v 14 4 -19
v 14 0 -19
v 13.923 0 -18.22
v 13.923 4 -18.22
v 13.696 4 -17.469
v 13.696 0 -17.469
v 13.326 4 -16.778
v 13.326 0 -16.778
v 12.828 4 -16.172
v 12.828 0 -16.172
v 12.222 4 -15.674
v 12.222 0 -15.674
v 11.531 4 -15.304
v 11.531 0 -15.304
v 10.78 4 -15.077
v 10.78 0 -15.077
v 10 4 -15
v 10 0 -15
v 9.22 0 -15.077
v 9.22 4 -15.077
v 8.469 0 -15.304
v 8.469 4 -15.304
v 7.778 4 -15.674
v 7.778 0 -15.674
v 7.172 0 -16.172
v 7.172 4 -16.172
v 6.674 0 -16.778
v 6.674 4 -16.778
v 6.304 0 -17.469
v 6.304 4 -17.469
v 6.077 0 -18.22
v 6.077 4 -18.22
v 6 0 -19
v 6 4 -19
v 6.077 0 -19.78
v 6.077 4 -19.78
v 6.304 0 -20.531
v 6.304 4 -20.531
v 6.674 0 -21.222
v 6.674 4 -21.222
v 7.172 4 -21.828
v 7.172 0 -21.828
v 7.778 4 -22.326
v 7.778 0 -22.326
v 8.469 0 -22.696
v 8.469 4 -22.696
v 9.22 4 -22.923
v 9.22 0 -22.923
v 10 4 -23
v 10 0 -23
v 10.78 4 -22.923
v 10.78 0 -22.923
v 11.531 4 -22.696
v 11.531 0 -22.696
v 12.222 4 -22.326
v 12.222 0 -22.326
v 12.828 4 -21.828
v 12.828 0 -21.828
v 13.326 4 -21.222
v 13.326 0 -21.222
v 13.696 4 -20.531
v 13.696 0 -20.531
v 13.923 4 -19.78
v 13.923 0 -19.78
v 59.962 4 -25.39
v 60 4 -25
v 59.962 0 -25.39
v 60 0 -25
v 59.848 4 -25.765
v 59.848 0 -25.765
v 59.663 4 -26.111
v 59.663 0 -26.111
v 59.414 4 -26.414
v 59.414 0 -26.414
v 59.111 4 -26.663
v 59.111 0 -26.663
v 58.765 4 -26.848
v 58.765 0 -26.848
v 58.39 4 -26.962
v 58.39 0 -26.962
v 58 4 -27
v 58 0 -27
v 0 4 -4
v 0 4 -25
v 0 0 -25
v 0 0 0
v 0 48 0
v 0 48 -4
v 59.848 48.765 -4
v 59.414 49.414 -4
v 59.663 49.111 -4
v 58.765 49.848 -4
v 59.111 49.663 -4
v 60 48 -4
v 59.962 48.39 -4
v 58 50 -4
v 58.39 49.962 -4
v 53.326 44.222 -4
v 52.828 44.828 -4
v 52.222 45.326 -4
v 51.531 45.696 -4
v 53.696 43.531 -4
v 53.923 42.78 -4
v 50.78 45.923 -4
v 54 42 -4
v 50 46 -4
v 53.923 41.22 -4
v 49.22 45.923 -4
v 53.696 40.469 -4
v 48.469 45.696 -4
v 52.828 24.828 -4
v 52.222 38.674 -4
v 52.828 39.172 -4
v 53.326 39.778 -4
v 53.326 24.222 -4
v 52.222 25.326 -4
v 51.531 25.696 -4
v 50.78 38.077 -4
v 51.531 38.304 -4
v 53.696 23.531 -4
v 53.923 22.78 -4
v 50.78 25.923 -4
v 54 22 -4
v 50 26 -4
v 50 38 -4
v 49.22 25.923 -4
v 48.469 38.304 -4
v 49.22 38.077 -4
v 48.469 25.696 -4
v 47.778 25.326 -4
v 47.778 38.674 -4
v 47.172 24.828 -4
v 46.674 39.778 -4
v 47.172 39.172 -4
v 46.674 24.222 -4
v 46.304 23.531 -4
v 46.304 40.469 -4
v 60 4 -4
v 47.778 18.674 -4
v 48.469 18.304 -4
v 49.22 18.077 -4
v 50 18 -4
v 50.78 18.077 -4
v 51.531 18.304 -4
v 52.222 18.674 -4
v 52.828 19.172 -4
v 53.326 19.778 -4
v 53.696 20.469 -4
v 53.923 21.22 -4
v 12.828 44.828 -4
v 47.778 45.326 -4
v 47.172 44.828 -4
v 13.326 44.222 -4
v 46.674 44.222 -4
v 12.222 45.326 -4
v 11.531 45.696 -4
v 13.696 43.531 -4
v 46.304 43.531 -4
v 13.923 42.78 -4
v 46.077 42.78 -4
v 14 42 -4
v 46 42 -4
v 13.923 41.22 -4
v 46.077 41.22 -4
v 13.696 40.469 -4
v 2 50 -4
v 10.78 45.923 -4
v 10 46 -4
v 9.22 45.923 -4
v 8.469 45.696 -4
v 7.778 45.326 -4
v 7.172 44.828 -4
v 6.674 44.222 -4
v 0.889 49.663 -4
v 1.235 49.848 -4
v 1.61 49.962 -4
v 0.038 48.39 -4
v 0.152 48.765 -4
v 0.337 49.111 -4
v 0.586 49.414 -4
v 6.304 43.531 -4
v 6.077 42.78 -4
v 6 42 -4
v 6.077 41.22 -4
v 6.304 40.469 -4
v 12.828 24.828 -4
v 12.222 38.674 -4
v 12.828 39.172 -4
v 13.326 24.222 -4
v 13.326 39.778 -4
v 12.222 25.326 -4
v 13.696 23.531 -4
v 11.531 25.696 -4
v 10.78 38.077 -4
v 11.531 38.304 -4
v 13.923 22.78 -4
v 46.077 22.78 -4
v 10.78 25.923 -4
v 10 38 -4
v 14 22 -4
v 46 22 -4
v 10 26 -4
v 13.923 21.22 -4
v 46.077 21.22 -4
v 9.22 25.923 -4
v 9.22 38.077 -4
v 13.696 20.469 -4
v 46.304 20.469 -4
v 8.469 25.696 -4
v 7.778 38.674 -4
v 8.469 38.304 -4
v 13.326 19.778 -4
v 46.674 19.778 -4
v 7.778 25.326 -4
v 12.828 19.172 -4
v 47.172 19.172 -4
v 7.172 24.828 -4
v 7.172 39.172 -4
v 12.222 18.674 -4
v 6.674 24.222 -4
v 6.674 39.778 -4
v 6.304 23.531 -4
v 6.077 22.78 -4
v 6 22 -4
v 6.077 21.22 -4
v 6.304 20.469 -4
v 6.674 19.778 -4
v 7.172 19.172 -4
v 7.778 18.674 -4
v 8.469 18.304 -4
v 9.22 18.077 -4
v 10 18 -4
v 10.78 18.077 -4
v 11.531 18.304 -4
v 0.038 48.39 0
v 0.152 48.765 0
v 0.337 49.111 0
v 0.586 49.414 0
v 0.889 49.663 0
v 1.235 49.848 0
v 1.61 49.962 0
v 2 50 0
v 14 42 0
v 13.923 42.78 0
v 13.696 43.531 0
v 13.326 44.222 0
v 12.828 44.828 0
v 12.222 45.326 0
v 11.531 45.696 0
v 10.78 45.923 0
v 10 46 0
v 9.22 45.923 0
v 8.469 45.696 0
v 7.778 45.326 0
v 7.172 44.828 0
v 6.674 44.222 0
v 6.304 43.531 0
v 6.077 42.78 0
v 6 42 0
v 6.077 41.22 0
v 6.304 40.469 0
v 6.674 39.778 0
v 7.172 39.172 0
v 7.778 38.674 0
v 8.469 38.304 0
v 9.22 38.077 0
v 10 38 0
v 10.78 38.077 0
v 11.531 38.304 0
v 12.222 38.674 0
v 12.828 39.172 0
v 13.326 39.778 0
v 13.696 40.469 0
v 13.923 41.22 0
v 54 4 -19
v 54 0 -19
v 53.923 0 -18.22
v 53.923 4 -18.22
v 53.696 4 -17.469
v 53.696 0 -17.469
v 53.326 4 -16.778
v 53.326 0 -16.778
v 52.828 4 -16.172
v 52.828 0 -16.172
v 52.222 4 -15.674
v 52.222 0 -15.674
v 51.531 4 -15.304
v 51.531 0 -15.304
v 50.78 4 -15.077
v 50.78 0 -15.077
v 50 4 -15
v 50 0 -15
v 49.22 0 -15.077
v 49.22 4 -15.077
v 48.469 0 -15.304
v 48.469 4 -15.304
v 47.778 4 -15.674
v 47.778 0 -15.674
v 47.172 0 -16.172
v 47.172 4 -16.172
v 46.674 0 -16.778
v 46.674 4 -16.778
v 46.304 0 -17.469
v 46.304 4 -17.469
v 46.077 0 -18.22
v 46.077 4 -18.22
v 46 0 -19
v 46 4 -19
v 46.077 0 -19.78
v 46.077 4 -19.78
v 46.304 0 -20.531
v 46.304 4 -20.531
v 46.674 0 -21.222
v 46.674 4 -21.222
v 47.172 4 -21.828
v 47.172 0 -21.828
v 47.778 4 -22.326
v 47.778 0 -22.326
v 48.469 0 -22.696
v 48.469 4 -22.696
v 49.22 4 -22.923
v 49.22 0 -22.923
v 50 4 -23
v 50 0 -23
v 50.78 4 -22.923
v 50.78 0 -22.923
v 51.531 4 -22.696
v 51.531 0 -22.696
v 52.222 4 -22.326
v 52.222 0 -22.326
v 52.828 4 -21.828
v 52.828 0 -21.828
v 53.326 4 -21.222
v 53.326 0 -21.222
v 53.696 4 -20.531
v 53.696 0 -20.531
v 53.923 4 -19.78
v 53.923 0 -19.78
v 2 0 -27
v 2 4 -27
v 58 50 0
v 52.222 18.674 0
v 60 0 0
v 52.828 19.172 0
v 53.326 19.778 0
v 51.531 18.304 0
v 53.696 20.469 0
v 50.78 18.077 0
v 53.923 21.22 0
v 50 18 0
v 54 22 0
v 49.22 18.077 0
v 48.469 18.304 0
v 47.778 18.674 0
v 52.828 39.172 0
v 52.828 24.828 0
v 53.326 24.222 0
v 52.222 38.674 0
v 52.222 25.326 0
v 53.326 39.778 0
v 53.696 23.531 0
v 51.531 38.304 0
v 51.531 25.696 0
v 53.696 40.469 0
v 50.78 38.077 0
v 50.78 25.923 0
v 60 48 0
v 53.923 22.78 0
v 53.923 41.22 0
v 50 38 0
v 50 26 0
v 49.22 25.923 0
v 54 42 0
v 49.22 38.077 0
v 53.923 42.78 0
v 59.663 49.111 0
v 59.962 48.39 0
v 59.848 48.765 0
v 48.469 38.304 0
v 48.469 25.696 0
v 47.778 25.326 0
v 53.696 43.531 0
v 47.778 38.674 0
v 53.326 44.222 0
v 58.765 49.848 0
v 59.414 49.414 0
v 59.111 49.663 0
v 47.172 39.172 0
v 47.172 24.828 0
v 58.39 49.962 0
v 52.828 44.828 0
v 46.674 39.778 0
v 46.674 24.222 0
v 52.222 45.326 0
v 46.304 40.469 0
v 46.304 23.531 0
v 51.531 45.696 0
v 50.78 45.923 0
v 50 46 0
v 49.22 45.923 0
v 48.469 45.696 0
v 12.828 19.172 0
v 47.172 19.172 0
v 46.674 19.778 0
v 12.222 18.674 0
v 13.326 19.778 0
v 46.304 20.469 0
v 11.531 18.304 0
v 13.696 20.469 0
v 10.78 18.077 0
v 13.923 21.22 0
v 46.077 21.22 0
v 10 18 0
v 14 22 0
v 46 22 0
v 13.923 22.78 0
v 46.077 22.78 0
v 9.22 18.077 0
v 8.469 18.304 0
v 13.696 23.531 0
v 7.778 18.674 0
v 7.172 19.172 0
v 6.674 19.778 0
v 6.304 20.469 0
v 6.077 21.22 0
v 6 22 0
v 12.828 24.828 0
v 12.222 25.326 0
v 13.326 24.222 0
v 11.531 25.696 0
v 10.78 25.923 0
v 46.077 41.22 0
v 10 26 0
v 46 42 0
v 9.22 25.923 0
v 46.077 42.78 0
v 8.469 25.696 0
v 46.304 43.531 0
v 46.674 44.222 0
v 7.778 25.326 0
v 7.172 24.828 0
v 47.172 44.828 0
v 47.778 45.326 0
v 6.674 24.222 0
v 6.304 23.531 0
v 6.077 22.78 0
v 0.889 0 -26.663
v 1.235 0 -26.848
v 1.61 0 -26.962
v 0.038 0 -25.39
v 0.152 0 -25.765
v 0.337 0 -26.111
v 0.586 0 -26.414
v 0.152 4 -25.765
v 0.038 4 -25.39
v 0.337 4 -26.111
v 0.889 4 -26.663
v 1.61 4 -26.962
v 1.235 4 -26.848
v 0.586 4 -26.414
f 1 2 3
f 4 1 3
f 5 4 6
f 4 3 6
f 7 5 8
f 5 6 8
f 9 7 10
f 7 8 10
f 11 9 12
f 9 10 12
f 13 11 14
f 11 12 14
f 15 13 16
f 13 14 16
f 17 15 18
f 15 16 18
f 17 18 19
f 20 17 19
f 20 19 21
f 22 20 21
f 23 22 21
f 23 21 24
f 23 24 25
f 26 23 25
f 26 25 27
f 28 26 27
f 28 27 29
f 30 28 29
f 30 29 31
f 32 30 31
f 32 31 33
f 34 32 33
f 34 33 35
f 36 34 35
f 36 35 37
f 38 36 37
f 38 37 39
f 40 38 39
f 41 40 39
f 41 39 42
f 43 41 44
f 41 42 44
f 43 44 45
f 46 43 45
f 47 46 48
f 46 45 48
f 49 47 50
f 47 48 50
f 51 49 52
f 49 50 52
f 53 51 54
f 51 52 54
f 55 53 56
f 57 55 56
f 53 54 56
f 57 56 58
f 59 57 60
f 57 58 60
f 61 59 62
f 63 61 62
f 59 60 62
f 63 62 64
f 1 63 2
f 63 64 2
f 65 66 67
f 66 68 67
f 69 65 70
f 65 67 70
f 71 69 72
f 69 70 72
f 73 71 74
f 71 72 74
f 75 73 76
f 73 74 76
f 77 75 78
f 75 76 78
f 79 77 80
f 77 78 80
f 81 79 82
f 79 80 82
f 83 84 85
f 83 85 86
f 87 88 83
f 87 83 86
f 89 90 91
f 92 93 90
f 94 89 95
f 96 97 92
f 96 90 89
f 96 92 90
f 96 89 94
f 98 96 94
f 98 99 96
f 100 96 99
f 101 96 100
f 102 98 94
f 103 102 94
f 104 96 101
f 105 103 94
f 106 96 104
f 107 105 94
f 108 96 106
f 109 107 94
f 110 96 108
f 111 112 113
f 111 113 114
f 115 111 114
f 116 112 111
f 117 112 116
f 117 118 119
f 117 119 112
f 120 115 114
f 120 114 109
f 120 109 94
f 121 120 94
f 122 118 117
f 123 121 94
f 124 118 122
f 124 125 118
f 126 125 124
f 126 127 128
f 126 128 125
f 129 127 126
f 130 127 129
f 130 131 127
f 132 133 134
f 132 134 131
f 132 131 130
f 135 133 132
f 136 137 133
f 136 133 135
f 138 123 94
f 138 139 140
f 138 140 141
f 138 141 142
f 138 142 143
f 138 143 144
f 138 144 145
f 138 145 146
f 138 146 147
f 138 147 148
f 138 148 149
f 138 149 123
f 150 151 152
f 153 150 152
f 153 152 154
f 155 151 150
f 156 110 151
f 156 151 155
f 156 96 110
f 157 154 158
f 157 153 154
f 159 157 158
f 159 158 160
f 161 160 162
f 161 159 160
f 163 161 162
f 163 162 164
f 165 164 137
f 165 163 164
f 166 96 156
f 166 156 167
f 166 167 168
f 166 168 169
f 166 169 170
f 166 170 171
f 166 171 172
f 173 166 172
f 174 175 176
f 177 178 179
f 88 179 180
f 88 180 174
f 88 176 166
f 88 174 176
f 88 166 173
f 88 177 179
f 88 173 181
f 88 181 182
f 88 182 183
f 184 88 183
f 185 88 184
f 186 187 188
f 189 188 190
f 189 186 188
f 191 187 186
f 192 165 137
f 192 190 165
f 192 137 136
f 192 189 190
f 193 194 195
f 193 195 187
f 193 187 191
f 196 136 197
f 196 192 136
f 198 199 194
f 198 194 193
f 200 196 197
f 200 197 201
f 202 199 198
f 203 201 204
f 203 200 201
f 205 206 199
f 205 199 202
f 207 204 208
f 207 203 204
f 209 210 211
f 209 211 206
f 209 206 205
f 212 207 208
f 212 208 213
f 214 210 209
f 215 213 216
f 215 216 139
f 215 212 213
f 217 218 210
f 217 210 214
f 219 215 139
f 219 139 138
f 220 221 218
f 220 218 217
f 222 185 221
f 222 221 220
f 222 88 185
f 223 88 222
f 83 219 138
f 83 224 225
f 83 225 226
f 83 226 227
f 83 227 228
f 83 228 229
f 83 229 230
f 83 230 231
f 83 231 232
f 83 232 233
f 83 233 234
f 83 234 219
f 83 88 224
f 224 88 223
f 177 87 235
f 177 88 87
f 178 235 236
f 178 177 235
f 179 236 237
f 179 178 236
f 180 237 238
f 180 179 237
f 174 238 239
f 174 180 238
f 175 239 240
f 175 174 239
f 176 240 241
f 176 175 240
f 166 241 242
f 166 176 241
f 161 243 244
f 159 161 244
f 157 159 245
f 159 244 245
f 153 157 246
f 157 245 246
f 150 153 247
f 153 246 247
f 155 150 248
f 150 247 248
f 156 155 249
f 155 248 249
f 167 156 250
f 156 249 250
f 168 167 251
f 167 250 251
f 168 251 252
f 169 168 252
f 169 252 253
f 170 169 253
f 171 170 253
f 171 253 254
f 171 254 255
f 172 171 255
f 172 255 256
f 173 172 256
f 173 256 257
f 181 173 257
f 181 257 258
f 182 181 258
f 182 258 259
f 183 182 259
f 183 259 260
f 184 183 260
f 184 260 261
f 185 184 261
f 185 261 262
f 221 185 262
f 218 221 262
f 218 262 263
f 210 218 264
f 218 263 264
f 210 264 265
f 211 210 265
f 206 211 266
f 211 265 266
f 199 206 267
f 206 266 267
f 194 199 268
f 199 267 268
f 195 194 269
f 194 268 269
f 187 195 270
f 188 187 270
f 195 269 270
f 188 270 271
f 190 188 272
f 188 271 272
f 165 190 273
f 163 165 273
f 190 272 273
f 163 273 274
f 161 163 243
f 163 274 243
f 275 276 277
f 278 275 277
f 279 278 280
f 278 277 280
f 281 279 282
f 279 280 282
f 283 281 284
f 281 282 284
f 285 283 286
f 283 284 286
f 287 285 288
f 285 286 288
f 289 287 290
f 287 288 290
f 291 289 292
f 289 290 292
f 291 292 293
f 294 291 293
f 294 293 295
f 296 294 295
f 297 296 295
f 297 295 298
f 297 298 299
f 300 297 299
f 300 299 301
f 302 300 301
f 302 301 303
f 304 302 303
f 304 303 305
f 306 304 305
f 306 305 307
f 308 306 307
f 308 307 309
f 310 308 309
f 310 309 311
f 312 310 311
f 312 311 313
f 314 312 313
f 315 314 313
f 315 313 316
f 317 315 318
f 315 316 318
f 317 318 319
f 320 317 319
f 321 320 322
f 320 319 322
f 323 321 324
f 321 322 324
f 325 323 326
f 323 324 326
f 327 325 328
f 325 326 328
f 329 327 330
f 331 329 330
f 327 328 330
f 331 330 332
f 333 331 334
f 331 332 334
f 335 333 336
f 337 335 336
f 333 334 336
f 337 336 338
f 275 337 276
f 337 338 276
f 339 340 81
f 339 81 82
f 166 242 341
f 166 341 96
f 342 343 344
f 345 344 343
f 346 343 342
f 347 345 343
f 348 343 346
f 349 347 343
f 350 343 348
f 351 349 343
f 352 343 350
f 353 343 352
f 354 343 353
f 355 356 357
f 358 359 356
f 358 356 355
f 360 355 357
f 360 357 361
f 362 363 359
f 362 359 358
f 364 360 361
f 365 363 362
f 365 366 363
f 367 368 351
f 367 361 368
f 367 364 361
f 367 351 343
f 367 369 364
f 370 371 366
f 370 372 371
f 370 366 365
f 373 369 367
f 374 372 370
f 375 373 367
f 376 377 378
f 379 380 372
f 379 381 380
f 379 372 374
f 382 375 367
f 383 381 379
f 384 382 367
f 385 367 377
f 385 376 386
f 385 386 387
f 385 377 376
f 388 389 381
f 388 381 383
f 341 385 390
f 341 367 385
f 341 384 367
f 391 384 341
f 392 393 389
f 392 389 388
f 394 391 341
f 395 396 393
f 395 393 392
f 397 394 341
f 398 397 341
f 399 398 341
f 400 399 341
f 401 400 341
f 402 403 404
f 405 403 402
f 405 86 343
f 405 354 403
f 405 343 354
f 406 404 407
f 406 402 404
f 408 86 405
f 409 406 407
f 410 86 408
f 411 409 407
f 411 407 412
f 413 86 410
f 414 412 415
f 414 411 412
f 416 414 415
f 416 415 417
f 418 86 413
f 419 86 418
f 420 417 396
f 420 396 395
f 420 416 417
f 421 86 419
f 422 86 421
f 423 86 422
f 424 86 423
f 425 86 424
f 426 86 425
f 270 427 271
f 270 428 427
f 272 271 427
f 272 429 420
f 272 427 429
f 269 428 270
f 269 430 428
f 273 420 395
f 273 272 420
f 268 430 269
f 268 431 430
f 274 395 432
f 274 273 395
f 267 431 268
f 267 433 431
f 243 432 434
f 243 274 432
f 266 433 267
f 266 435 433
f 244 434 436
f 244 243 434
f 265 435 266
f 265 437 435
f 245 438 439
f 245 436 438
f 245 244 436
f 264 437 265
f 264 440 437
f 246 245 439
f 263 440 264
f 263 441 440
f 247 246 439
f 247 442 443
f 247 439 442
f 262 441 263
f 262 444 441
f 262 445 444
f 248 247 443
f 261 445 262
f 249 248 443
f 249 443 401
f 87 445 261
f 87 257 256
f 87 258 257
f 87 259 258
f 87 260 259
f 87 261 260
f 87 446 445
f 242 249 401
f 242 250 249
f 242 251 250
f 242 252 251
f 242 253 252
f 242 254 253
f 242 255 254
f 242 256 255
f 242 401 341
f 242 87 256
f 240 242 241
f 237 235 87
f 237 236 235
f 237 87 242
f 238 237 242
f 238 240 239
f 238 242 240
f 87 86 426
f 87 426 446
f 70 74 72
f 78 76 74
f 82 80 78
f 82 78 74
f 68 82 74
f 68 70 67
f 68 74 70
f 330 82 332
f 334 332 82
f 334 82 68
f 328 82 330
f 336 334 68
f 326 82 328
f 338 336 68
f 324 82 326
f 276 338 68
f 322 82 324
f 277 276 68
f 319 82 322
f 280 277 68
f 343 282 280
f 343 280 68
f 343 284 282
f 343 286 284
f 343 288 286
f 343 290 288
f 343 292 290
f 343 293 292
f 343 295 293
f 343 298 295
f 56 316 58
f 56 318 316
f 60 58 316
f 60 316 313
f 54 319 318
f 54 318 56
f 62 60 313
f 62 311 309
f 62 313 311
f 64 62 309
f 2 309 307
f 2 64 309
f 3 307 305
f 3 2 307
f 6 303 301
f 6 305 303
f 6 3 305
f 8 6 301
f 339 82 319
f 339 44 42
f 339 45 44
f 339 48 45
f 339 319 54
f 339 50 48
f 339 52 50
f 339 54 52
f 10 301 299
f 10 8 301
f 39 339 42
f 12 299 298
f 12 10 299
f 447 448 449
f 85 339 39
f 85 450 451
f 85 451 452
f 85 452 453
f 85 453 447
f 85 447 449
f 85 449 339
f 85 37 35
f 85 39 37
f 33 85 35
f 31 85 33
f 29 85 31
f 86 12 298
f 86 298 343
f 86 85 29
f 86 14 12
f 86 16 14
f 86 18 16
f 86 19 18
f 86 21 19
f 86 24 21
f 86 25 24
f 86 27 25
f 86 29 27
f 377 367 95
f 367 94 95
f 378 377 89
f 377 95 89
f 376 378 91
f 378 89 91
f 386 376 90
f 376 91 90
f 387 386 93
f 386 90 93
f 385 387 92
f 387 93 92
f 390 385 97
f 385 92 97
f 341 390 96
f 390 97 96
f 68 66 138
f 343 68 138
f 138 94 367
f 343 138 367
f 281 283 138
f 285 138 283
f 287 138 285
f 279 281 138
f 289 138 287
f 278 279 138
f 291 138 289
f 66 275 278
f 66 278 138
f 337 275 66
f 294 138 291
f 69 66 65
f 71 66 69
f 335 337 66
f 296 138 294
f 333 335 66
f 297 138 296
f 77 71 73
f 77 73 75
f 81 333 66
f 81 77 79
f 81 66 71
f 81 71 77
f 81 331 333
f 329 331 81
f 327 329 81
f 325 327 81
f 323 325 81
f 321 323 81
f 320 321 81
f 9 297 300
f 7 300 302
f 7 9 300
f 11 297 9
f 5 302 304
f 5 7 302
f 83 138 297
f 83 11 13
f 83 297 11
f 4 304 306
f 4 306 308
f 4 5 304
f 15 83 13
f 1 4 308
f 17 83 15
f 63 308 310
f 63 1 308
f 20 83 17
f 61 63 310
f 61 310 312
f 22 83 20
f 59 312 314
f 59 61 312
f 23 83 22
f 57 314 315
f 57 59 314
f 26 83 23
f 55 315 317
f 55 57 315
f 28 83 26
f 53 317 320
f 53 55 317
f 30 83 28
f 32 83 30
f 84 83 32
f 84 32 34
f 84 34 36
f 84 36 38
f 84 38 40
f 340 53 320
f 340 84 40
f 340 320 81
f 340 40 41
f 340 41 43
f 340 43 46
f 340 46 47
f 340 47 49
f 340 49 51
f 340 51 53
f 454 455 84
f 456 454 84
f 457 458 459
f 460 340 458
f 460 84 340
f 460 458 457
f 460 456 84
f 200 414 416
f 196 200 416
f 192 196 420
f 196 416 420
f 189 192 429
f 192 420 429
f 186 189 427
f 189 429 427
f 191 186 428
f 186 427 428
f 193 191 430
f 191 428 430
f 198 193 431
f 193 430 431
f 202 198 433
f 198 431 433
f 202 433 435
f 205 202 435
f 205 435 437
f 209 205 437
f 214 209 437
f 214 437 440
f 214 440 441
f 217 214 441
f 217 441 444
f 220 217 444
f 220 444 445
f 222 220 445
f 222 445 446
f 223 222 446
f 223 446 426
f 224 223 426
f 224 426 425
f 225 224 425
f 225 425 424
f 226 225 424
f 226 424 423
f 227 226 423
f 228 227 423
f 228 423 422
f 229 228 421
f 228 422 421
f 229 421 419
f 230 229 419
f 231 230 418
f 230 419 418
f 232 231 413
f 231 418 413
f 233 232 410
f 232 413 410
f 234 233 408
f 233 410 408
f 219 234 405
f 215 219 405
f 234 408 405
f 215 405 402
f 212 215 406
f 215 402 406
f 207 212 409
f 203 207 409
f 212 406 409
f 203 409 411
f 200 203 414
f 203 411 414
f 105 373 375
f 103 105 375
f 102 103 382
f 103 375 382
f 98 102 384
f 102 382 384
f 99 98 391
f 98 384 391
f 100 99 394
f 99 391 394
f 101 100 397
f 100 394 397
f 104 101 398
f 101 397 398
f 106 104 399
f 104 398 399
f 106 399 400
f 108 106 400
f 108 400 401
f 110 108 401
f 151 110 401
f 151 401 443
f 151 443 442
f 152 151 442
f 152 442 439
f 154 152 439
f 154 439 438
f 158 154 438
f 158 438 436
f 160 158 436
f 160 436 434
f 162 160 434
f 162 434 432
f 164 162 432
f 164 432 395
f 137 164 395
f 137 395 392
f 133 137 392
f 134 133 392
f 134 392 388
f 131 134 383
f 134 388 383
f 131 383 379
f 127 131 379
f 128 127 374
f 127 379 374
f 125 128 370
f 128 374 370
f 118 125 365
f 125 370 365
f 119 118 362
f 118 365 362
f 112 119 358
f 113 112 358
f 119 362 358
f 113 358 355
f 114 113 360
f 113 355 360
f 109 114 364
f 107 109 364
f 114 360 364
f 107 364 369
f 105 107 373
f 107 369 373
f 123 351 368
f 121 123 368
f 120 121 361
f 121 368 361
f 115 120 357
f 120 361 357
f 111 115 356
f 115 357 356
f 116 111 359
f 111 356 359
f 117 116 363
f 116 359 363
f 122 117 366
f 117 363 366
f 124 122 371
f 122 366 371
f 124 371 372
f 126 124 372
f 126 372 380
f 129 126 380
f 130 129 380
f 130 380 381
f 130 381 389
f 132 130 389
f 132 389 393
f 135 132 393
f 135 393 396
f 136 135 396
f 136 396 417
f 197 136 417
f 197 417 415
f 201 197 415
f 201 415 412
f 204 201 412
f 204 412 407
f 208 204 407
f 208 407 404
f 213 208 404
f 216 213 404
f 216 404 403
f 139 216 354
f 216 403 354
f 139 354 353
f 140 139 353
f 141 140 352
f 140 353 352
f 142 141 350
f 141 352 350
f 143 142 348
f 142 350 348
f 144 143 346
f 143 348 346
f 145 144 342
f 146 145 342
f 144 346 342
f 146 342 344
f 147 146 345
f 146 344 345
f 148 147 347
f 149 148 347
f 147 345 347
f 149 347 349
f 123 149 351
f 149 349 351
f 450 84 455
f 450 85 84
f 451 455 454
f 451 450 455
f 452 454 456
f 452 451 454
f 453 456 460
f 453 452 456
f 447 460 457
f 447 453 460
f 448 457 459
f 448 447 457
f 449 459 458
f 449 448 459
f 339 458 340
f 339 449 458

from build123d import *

# Parameters (mm, degrees)
BOSS_EXTRUDE1_DEPTH = 60
CUT_EXTRUDE3_REACH  = 29
SKETCH8_R           = 3.999999996
CUT_EXTRUDE4_REACH  = 52
SKETCH9_R           = 4.000000003
FILLET2_R           = 2


with BuildPart() as part:
    # Sketch1 → Boss-Extrude1 (new body)
    with BuildSketch(Plane(origin=(0, 0, 0), x_dir=(0, 0, -1), z_dir=(1, 0, 0))):
        Polygon((0, 0), (0, 50), (4, 50), (4, 4), (27, 4), (27, 0), align=None)
    extrude(amount=BOSS_EXTRUDE1_DEPTH)

    # Sketch8 → Cut-Extrude3 (cut, up to next)
    with BuildSketch(Plane.XY, mode=Mode.PRIVATE) as cut_extrude3_sk1:
        with Locations((10, 22)):
            Circle(SKETCH8_R)
    cut_extrude3_tool1 = extrude(cut_extrude3_sk1.sketch, amount=-CUT_EXTRUDE3_REACH, mode=Mode.PRIVATE) & part.part
    add(cut_extrude3_tool1.solids().sort_by_distance((10, 22, 0))[0], mode=Mode.SUBTRACT)
    # Sketch8 → Cut-Extrude3 (cut, up to next)
    with BuildSketch(Plane.XY, mode=Mode.PRIVATE) as cut_extrude3_sk2:
        with Locations((50, 22)):
            Circle(SKETCH8_R)
    cut_extrude3_tool2 = extrude(cut_extrude3_sk2.sketch, amount=-CUT_EXTRUDE3_REACH, mode=Mode.PRIVATE) & part.part
    add(cut_extrude3_tool2.solids().sort_by_distance((50, 22, 0))[0], mode=Mode.SUBTRACT)
    # Sketch8 → Cut-Extrude3 (cut, up to next)
    with BuildSketch(Plane.XY, mode=Mode.PRIVATE) as cut_extrude3_sk3:
        with Locations((50, 42)):
            Circle(SKETCH8_R)
    cut_extrude3_tool3 = extrude(cut_extrude3_sk3.sketch, amount=-CUT_EXTRUDE3_REACH, mode=Mode.PRIVATE) & part.part
    add(cut_extrude3_tool3.solids().sort_by_distance((50, 42, 0))[0], mode=Mode.SUBTRACT)
    # Sketch8 → Cut-Extrude3 (cut, up to next)
    with BuildSketch(Plane.XY, mode=Mode.PRIVATE) as cut_extrude3_sk4:
        with Locations((10, 42)):
            Circle(SKETCH8_R)
    cut_extrude3_tool4 = extrude(cut_extrude3_sk4.sketch, amount=-CUT_EXTRUDE3_REACH, mode=Mode.PRIVATE) & part.part
    add(cut_extrude3_tool4.solids().sort_by_distance((10, 42, 0))[0], mode=Mode.SUBTRACT)

    # Sketch9 → Cut-Extrude4 (cut, up to next)
    with BuildSketch(Plane.XZ, mode=Mode.PRIVATE) as cut_extrude4_sk1:
        with Locations((50, -19)):
            Circle(SKETCH9_R)
    cut_extrude4_tool1 = extrude(cut_extrude4_sk1.sketch, amount=-CUT_EXTRUDE4_REACH, mode=Mode.PRIVATE) & part.part
    add(cut_extrude4_tool1.solids().sort_by_distance((50, 0, -19))[0], mode=Mode.SUBTRACT)
    # Sketch9 → Cut-Extrude4 (cut, up to next)
    with BuildSketch(Plane.XZ, mode=Mode.PRIVATE) as cut_extrude4_sk2:
        with Locations((10, -19)):
            Circle(SKETCH9_R)
    cut_extrude4_tool2 = extrude(cut_extrude4_sk2.sketch, amount=-CUT_EXTRUDE4_REACH, mode=Mode.PRIVATE) & part.part
    add(cut_extrude4_tool2.solids().sort_by_distance((10, 0, -19))[0], mode=Mode.SUBTRACT)

    # Fillet2
    fillet2_edges = [part.edges().sort_by_distance(p)[0] for p in [
        (60, 50, -2),
        (0, 50, -2),
        (60, 2, -27),
        (0, 2, -27),
    ]]
    fillet(fillet2_edges, radius=FILLET2_R)


solid = part.part
